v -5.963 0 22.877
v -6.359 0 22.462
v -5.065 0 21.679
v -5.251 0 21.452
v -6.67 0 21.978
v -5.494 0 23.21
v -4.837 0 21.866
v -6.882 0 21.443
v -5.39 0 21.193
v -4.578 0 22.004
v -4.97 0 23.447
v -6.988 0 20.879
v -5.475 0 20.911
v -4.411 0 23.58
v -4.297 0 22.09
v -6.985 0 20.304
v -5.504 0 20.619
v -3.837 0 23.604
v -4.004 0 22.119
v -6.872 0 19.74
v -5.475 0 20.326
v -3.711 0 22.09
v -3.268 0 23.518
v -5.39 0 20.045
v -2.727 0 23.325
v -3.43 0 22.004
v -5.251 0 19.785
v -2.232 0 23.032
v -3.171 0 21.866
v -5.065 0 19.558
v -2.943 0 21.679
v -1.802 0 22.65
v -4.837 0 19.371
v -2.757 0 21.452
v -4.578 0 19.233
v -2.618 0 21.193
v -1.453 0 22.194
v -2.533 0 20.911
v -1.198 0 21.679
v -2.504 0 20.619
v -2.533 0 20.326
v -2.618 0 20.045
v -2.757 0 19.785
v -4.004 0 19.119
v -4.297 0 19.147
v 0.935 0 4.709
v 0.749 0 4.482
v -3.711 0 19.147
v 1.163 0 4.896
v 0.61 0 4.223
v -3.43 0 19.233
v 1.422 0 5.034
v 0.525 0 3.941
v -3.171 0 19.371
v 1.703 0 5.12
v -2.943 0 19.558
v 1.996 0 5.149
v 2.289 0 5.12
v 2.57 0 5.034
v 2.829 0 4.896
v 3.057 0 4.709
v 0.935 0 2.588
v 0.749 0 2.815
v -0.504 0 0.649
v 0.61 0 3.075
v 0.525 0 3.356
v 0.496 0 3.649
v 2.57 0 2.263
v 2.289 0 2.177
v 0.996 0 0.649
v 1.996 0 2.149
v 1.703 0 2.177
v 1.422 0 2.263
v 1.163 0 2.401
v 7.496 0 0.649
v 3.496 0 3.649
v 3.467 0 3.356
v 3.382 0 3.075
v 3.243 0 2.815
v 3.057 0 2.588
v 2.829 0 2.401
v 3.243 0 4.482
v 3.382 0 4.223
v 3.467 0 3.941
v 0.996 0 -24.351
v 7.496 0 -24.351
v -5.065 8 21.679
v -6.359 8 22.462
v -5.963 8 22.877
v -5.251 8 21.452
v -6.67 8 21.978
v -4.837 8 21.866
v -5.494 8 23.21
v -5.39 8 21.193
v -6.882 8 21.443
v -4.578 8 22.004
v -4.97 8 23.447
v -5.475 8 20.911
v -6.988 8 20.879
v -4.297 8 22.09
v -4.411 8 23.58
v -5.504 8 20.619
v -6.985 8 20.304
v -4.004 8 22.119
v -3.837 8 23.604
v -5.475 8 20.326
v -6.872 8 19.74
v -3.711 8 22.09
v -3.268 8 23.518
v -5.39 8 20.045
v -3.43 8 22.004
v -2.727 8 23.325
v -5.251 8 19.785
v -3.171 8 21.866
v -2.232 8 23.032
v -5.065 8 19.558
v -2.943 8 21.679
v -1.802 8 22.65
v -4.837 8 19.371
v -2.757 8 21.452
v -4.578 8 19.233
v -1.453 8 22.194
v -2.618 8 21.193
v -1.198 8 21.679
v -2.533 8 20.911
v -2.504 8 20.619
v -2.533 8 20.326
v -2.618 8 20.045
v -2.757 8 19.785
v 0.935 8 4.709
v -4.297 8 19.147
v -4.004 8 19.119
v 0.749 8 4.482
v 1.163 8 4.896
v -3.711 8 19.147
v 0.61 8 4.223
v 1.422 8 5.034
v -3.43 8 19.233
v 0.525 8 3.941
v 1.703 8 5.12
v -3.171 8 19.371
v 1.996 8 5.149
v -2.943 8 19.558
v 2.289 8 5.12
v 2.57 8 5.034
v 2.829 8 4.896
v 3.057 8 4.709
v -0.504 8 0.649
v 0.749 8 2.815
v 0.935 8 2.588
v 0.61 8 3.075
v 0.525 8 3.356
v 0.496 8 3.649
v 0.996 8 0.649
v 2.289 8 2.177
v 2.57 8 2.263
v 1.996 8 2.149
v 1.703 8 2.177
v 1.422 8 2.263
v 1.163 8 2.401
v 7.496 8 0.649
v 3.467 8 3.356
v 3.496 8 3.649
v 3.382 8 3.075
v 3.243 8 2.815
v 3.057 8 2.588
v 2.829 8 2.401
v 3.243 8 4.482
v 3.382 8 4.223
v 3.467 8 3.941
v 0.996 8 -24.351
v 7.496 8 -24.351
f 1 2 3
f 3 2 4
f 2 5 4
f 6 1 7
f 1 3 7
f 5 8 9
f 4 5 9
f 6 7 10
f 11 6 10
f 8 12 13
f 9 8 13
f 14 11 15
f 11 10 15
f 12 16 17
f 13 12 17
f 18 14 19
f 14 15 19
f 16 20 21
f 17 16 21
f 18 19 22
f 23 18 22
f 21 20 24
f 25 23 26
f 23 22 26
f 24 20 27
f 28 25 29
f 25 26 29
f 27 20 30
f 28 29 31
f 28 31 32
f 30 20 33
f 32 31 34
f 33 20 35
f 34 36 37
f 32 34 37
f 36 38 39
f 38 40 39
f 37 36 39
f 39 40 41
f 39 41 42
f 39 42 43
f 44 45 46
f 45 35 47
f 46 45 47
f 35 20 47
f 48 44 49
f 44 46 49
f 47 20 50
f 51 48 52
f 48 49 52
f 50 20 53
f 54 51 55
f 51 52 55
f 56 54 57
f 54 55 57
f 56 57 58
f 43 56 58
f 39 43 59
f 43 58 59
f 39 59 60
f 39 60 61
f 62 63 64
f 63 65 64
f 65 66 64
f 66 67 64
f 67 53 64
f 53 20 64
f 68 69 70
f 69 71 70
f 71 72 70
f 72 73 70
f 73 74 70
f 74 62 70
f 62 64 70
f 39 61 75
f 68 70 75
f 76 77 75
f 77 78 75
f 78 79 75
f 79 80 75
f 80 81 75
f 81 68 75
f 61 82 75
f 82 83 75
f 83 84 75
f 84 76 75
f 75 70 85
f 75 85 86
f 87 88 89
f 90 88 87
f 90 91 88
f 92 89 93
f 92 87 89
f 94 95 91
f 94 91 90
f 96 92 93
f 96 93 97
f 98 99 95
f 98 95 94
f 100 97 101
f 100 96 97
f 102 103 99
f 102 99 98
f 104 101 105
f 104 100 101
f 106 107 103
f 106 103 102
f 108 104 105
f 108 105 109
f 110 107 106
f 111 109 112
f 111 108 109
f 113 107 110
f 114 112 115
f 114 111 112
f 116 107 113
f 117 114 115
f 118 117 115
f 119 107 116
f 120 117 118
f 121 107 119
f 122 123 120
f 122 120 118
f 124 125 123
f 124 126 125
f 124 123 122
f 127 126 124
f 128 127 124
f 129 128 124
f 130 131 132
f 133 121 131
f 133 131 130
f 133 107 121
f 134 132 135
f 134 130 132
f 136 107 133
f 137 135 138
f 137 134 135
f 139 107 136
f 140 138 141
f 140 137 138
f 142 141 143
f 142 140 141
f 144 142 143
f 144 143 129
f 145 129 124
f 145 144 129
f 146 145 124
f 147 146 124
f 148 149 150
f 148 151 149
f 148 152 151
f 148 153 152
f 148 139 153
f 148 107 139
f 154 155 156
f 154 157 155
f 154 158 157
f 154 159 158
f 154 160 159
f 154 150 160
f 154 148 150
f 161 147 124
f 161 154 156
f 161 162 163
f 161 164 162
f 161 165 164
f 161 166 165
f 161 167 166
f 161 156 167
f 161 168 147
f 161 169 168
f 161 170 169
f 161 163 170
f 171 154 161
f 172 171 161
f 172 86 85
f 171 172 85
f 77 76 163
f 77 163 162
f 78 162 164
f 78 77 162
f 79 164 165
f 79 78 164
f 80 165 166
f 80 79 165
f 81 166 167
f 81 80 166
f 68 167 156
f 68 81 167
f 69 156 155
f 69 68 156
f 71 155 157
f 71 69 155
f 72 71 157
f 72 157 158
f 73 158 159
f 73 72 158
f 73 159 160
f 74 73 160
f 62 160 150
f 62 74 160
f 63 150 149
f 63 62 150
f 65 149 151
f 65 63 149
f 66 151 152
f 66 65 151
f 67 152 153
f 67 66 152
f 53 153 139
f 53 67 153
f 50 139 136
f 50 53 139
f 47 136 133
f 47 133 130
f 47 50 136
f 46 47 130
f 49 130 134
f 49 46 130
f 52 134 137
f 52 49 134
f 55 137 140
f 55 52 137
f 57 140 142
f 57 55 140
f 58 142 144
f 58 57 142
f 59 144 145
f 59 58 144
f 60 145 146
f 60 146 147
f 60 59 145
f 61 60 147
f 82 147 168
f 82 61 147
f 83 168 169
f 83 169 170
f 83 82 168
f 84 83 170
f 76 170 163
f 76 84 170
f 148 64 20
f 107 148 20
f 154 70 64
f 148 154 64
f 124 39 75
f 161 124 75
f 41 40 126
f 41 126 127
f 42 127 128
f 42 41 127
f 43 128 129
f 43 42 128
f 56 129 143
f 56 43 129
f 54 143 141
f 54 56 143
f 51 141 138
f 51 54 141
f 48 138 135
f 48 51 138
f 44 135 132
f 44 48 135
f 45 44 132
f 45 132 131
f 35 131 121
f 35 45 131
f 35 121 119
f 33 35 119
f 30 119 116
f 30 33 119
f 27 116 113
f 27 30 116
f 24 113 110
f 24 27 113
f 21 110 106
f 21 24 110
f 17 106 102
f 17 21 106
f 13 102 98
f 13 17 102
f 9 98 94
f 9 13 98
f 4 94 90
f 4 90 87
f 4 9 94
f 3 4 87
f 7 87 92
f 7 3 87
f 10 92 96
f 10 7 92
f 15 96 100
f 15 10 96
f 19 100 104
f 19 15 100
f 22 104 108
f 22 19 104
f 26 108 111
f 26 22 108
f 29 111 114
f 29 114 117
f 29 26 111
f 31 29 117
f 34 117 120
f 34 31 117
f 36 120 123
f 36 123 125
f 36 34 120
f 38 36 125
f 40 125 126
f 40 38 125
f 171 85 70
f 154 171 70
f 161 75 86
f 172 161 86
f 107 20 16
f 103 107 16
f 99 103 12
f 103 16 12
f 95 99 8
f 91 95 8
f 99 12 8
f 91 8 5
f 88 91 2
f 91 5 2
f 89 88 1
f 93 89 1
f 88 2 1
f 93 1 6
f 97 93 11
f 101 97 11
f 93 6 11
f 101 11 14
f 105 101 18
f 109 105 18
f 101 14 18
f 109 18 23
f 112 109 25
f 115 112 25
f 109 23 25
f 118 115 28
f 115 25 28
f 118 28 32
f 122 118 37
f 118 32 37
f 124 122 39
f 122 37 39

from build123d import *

# Parameters (mm, degrees)
CROQUIS1_R              = 1.5000002
CROQUIS1_R_2            = 1.49999991
SALIENTE_EXTRUIR1_DEPTH = 8


with BuildPart() as part:
    # Croquis1 → Saliente-Extruir1 (new body)
    with BuildSketch(Plane(origin=(0, 0, 0), x_dir=(1, 0, 0), z_dir=(0, 1, 0))):
        with BuildLine():
            Line((-1.19757039, -21.678985349), (7.496084148, -0.648595564))
            Line((7.496084148, -0.648595564), (7.496084148, 24.351404436))
            Line((7.496084148, 24.351404436), (0.996084148, 24.351404436))
            Line((0.996084148, 24.351404436), (0.996084148, -0.648595564))
            Line((0.996084148, -0.648595564), (-0.503915852, -0.648595564))
            Line((-0.503915852, -0.648595564), (-6.872429124, -19.740170948))
            ThreePointArc((-6.872429124, -19.740170948), (-4.970266204, -23.44707843), (-1.19757039, -21.678985349))
        make_face()
        with Locations((1.996084371, -3.648597796)):
            Circle(CROQUIS1_R, mode=Mode.SUBTRACT)
        with Locations((-4.003916027, -20.618596904)):
            Circle(CROQUIS1_R_2, mode=Mode.SUBTRACT)
    extrude(amount=SALIENTE_EXTRUIR1_DEPTH)


solid = part.part
